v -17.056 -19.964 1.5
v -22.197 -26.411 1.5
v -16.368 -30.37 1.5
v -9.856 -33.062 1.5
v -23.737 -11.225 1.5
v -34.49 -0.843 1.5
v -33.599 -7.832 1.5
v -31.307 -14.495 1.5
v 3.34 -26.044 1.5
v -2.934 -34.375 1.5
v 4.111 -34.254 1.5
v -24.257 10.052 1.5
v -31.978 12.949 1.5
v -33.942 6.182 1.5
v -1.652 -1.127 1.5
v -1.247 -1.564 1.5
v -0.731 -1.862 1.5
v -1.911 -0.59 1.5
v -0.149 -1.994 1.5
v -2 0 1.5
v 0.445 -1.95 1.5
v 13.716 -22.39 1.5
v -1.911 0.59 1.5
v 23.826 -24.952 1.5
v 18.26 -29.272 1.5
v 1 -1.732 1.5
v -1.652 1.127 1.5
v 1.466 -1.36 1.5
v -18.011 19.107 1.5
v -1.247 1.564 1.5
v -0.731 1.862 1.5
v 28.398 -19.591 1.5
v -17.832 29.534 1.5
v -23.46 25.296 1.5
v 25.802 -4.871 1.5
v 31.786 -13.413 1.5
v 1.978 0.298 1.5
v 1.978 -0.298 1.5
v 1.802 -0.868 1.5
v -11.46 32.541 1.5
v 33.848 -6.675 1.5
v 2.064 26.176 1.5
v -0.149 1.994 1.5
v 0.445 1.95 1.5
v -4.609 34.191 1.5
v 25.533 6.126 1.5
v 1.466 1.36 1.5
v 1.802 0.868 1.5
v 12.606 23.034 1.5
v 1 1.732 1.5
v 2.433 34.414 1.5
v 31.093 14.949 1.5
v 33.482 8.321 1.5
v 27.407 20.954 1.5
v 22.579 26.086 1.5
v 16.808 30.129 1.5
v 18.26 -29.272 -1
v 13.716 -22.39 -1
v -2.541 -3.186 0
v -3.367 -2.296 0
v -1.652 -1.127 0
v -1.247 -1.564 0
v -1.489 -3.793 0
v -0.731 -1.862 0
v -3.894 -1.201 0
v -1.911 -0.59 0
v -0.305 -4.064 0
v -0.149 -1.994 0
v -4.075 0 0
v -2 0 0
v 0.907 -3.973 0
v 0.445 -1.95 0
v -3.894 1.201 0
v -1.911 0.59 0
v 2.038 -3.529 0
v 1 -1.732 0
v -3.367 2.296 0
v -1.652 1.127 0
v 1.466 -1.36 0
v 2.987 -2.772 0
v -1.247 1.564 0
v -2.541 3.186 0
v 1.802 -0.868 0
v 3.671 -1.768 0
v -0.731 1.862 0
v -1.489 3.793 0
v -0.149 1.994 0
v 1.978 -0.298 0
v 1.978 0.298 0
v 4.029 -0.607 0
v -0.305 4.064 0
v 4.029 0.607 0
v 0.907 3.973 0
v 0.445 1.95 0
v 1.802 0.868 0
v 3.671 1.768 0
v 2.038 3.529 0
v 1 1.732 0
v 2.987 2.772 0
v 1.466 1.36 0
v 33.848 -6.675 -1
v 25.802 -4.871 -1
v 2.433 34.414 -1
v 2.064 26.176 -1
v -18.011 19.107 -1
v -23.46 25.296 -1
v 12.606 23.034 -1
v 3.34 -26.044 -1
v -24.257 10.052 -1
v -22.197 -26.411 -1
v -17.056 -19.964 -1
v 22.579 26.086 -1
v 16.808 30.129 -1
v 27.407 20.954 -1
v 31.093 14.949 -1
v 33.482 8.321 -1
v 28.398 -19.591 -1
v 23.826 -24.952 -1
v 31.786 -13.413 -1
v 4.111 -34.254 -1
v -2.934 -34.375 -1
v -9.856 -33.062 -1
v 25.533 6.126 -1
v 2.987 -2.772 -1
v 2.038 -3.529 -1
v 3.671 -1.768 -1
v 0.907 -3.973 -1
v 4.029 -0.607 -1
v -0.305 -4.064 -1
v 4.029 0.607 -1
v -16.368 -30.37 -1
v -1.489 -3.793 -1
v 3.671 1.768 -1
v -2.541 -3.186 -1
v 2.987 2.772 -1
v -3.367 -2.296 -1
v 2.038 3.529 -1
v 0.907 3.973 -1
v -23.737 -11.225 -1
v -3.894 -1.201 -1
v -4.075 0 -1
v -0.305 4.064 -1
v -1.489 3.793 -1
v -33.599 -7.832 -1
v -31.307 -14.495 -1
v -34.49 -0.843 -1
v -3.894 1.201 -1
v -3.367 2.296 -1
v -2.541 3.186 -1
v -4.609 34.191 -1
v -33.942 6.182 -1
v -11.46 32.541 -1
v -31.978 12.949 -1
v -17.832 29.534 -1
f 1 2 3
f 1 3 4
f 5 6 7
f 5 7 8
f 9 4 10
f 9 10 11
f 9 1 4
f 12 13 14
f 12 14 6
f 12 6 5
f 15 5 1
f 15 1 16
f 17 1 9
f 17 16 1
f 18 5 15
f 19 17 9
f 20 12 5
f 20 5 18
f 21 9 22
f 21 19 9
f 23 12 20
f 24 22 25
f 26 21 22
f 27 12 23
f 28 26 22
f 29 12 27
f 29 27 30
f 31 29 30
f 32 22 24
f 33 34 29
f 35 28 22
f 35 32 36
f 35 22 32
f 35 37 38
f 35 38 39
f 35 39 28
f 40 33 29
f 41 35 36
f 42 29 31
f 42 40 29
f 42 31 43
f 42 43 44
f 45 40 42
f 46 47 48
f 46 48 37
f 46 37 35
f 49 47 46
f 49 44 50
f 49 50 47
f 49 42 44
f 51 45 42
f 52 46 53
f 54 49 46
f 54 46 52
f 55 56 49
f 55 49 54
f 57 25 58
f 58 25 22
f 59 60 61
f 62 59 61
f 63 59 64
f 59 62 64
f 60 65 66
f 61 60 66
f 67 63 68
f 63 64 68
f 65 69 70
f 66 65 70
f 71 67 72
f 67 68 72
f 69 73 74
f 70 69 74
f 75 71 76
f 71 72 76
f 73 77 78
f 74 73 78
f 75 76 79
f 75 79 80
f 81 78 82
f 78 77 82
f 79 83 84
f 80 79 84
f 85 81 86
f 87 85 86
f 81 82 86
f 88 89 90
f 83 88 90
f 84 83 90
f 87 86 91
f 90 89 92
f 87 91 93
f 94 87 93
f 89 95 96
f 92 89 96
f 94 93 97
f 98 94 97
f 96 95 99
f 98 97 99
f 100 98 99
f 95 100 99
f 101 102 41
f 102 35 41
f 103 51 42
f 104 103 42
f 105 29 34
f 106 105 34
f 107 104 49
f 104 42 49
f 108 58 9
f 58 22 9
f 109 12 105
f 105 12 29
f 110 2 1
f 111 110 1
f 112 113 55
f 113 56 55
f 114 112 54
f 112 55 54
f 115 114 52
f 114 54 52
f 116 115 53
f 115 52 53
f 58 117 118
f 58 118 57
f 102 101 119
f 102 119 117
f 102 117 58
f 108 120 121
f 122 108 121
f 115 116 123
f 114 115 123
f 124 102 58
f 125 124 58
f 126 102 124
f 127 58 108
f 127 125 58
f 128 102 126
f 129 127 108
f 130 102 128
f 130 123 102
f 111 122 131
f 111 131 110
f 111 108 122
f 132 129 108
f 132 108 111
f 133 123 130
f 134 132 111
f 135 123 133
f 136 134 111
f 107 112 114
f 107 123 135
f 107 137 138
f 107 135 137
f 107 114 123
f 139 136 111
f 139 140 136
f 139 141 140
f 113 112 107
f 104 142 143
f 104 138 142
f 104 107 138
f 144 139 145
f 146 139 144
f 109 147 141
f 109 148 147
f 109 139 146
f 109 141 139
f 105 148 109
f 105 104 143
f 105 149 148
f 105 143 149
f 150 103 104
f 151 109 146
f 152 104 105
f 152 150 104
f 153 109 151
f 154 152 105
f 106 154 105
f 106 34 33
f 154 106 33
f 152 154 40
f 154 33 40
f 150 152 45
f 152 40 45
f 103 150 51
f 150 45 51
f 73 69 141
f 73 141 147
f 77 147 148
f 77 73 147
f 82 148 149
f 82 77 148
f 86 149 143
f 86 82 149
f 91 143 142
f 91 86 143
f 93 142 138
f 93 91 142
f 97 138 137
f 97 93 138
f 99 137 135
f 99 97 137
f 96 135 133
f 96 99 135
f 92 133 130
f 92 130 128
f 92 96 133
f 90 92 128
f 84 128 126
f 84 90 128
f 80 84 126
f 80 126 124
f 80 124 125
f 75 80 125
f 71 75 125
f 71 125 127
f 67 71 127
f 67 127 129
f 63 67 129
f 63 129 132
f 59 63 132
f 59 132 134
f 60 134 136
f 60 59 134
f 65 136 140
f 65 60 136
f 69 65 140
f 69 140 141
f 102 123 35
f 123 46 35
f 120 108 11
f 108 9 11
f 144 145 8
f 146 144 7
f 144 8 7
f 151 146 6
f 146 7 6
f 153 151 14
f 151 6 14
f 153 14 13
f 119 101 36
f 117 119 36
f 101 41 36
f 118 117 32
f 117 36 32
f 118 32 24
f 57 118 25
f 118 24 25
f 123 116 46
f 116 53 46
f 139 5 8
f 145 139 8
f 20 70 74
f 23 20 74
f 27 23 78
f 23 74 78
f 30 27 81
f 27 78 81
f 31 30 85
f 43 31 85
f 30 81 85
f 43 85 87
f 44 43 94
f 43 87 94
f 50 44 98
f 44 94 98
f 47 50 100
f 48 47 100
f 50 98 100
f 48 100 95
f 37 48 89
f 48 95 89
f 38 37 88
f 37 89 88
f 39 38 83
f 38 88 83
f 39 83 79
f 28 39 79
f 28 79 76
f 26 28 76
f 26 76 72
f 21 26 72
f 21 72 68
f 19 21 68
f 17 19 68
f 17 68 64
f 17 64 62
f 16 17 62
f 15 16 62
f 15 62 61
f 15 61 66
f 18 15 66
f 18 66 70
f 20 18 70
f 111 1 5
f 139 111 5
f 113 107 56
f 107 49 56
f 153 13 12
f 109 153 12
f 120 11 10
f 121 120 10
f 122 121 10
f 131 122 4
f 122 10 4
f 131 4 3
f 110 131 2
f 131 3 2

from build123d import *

# Parameters (mm, degrees)
BOSS_EXTRUDE1_DEPTH = 1.5
SKETCH2_R           = 4.075
BOSS_EXTRUDE2_DEPTH = 1
SKETCH3_R           = 2
CUT_EXTRUDE1_DEPTH  = 2.5


with BuildPart() as part:
    # Sketch1 → Boss-Extrude1 (new body)
    with BuildSketch(Plane.XY):
        with BuildLine():
            Line((-23.460220375, 25.295613453), (-18.010816917, 19.106590755))
            Line((-18.010816917, 19.106590755), (-24.257098112, 10.052090702))
            Line((-24.257098112, 10.052090702), (-31.977876551, 12.948567925))
            ThreePointArc((-31.977876551, 12.948567925), (-34.489701397, -0.842910146), (-31.307164796, -14.495221021))
            Line((-31.307164796, -14.495221021), (-23.737096152, -11.225043545))
            Line((-23.737096152, -11.225043545), (-17.055961915, -19.96360437))
            Line((-17.055961915, -19.96360437), (-22.1965272, -26.411440329))
            ThreePointArc((-22.1965272, -26.411440329), (-9.856248675, -33.062128819), (4.11132844, -34.254152718))
            Line((4.11132844, -34.254152718), (3.340484701, -26.044049191))
            Line((3.340484701, -26.044049191), (13.715933938, -22.39027674))
            Line((13.715933938, -22.39027674), (18.259668309, -29.27173574))
            ThreePointArc((18.259668309, -29.27173574), (28.398204714, -19.590609204), (33.84810551, -6.675009615))
            Line((33.84810551, -6.675009615), (25.801629236, -4.87106406))
            Line((25.801629236, -4.87106406), (25.532875276, 6.125652327))
            Line((25.532875276, 6.125652327), (33.481622838, 8.320512732))
            ThreePointArc((33.481622838, 8.320512732), (27.407304408, 20.95446647), (16.80795122, 30.128769901))
            Line((16.80795122, 30.128769901), (12.605799132, 23.03356604))
            Line((12.605799132, 23.03356604), (2.064250813, 26.176138082))
            Line((2.064250813, 26.176138082), (2.433112603, 34.414095412))
            ThreePointArc((2.433112603, 34.414095412), (-11.45955905, 32.541181699), (-23.460220375, 25.295613453))
        make_face()
    extrude(amount=BOSS_EXTRUDE1_DEPTH)

    # Sketch2 → Boss-Extrude2 (add)
    with BuildSketch(Plane(origin=(0, 0, 0), x_dir=(-1, 0, 0), z_dir=(0, 0, -1))):
        with BuildLine():
            Line((-2.433112603, 34.414095412), (-2.064250813, 26.176138082))
            Line((-2.064250813, 26.176138082), (-12.605799132, 23.03356604))
            Line((-12.605799132, 23.03356604), (-16.80795122, 30.128769901))
            ThreePointArc((-16.80795122, 30.128769901), (-27.407304408, 20.95446647), (-33.481622838, 8.320512732))
            Line((-33.481622838, 8.320512732), (-25.532875276, 6.125652327))
            Line((-25.532875276, 6.125652327), (-25.801629236, -4.87106406))
            Line((-25.801629236, -4.87106406), (-33.84810551, -6.675009615))
            ThreePointArc((-33.84810551, -6.675009615), (-28.398204714, -19.590609204), (-18.259668309, -29.27173574))
            Line((-18.259668309, -29.27173574), (-13.715933938, -22.39027674))
            Line((-13.715933938, -22.39027674), (-3.340484701, -26.044049191))
            Line((-3.340484701, -26.044049191), (-4.11132844, -34.254152718))
            ThreePointArc((-4.11132844, -34.254152718), (9.856248675, -33.062128819), (22.1965272, -26.411440329))
            Line((22.1965272, -26.411440329), (17.055961915, -19.96360437))
            Line((17.055961915, -19.96360437), (23.737096152, -11.225043545))
            Line((23.737096152, -11.225043545), (31.307164796, -14.495221021))
            ThreePointArc((31.307164796, -14.495221021), (34.489701397, -0.842910146), (31.977876551, 12.948567925))
            Line((31.977876551, 12.948567925), (24.257098112, 10.052090702))
            Line((24.257098112, 10.052090702), (18.010816917, 19.106590755))
            Line((18.010816917, 19.106590755), (23.460220375, 25.295613453))
            ThreePointArc((23.460220375, 25.295613453), (11.45955905, 32.541181699), (-2.433112603, 34.414095412))
        make_face()
        Circle(SKETCH2_R, mode=Mode.SUBTRACT)
    extrude(amount=BOSS_EXTRUDE2_DEPTH)

    # Sketch3 → Cut-Extrude1 (cut, through all)
    with BuildSketch(Plane(origin=(0, 0, 0), x_dir=(-1, 0, 0), z_dir=(0, 0, -1))):
        Circle(SKETCH3_R)
    extrude(amount=-CUT_EXTRUDE1_DEPTH, mode=Mode.SUBTRACT)


solid = part.part
